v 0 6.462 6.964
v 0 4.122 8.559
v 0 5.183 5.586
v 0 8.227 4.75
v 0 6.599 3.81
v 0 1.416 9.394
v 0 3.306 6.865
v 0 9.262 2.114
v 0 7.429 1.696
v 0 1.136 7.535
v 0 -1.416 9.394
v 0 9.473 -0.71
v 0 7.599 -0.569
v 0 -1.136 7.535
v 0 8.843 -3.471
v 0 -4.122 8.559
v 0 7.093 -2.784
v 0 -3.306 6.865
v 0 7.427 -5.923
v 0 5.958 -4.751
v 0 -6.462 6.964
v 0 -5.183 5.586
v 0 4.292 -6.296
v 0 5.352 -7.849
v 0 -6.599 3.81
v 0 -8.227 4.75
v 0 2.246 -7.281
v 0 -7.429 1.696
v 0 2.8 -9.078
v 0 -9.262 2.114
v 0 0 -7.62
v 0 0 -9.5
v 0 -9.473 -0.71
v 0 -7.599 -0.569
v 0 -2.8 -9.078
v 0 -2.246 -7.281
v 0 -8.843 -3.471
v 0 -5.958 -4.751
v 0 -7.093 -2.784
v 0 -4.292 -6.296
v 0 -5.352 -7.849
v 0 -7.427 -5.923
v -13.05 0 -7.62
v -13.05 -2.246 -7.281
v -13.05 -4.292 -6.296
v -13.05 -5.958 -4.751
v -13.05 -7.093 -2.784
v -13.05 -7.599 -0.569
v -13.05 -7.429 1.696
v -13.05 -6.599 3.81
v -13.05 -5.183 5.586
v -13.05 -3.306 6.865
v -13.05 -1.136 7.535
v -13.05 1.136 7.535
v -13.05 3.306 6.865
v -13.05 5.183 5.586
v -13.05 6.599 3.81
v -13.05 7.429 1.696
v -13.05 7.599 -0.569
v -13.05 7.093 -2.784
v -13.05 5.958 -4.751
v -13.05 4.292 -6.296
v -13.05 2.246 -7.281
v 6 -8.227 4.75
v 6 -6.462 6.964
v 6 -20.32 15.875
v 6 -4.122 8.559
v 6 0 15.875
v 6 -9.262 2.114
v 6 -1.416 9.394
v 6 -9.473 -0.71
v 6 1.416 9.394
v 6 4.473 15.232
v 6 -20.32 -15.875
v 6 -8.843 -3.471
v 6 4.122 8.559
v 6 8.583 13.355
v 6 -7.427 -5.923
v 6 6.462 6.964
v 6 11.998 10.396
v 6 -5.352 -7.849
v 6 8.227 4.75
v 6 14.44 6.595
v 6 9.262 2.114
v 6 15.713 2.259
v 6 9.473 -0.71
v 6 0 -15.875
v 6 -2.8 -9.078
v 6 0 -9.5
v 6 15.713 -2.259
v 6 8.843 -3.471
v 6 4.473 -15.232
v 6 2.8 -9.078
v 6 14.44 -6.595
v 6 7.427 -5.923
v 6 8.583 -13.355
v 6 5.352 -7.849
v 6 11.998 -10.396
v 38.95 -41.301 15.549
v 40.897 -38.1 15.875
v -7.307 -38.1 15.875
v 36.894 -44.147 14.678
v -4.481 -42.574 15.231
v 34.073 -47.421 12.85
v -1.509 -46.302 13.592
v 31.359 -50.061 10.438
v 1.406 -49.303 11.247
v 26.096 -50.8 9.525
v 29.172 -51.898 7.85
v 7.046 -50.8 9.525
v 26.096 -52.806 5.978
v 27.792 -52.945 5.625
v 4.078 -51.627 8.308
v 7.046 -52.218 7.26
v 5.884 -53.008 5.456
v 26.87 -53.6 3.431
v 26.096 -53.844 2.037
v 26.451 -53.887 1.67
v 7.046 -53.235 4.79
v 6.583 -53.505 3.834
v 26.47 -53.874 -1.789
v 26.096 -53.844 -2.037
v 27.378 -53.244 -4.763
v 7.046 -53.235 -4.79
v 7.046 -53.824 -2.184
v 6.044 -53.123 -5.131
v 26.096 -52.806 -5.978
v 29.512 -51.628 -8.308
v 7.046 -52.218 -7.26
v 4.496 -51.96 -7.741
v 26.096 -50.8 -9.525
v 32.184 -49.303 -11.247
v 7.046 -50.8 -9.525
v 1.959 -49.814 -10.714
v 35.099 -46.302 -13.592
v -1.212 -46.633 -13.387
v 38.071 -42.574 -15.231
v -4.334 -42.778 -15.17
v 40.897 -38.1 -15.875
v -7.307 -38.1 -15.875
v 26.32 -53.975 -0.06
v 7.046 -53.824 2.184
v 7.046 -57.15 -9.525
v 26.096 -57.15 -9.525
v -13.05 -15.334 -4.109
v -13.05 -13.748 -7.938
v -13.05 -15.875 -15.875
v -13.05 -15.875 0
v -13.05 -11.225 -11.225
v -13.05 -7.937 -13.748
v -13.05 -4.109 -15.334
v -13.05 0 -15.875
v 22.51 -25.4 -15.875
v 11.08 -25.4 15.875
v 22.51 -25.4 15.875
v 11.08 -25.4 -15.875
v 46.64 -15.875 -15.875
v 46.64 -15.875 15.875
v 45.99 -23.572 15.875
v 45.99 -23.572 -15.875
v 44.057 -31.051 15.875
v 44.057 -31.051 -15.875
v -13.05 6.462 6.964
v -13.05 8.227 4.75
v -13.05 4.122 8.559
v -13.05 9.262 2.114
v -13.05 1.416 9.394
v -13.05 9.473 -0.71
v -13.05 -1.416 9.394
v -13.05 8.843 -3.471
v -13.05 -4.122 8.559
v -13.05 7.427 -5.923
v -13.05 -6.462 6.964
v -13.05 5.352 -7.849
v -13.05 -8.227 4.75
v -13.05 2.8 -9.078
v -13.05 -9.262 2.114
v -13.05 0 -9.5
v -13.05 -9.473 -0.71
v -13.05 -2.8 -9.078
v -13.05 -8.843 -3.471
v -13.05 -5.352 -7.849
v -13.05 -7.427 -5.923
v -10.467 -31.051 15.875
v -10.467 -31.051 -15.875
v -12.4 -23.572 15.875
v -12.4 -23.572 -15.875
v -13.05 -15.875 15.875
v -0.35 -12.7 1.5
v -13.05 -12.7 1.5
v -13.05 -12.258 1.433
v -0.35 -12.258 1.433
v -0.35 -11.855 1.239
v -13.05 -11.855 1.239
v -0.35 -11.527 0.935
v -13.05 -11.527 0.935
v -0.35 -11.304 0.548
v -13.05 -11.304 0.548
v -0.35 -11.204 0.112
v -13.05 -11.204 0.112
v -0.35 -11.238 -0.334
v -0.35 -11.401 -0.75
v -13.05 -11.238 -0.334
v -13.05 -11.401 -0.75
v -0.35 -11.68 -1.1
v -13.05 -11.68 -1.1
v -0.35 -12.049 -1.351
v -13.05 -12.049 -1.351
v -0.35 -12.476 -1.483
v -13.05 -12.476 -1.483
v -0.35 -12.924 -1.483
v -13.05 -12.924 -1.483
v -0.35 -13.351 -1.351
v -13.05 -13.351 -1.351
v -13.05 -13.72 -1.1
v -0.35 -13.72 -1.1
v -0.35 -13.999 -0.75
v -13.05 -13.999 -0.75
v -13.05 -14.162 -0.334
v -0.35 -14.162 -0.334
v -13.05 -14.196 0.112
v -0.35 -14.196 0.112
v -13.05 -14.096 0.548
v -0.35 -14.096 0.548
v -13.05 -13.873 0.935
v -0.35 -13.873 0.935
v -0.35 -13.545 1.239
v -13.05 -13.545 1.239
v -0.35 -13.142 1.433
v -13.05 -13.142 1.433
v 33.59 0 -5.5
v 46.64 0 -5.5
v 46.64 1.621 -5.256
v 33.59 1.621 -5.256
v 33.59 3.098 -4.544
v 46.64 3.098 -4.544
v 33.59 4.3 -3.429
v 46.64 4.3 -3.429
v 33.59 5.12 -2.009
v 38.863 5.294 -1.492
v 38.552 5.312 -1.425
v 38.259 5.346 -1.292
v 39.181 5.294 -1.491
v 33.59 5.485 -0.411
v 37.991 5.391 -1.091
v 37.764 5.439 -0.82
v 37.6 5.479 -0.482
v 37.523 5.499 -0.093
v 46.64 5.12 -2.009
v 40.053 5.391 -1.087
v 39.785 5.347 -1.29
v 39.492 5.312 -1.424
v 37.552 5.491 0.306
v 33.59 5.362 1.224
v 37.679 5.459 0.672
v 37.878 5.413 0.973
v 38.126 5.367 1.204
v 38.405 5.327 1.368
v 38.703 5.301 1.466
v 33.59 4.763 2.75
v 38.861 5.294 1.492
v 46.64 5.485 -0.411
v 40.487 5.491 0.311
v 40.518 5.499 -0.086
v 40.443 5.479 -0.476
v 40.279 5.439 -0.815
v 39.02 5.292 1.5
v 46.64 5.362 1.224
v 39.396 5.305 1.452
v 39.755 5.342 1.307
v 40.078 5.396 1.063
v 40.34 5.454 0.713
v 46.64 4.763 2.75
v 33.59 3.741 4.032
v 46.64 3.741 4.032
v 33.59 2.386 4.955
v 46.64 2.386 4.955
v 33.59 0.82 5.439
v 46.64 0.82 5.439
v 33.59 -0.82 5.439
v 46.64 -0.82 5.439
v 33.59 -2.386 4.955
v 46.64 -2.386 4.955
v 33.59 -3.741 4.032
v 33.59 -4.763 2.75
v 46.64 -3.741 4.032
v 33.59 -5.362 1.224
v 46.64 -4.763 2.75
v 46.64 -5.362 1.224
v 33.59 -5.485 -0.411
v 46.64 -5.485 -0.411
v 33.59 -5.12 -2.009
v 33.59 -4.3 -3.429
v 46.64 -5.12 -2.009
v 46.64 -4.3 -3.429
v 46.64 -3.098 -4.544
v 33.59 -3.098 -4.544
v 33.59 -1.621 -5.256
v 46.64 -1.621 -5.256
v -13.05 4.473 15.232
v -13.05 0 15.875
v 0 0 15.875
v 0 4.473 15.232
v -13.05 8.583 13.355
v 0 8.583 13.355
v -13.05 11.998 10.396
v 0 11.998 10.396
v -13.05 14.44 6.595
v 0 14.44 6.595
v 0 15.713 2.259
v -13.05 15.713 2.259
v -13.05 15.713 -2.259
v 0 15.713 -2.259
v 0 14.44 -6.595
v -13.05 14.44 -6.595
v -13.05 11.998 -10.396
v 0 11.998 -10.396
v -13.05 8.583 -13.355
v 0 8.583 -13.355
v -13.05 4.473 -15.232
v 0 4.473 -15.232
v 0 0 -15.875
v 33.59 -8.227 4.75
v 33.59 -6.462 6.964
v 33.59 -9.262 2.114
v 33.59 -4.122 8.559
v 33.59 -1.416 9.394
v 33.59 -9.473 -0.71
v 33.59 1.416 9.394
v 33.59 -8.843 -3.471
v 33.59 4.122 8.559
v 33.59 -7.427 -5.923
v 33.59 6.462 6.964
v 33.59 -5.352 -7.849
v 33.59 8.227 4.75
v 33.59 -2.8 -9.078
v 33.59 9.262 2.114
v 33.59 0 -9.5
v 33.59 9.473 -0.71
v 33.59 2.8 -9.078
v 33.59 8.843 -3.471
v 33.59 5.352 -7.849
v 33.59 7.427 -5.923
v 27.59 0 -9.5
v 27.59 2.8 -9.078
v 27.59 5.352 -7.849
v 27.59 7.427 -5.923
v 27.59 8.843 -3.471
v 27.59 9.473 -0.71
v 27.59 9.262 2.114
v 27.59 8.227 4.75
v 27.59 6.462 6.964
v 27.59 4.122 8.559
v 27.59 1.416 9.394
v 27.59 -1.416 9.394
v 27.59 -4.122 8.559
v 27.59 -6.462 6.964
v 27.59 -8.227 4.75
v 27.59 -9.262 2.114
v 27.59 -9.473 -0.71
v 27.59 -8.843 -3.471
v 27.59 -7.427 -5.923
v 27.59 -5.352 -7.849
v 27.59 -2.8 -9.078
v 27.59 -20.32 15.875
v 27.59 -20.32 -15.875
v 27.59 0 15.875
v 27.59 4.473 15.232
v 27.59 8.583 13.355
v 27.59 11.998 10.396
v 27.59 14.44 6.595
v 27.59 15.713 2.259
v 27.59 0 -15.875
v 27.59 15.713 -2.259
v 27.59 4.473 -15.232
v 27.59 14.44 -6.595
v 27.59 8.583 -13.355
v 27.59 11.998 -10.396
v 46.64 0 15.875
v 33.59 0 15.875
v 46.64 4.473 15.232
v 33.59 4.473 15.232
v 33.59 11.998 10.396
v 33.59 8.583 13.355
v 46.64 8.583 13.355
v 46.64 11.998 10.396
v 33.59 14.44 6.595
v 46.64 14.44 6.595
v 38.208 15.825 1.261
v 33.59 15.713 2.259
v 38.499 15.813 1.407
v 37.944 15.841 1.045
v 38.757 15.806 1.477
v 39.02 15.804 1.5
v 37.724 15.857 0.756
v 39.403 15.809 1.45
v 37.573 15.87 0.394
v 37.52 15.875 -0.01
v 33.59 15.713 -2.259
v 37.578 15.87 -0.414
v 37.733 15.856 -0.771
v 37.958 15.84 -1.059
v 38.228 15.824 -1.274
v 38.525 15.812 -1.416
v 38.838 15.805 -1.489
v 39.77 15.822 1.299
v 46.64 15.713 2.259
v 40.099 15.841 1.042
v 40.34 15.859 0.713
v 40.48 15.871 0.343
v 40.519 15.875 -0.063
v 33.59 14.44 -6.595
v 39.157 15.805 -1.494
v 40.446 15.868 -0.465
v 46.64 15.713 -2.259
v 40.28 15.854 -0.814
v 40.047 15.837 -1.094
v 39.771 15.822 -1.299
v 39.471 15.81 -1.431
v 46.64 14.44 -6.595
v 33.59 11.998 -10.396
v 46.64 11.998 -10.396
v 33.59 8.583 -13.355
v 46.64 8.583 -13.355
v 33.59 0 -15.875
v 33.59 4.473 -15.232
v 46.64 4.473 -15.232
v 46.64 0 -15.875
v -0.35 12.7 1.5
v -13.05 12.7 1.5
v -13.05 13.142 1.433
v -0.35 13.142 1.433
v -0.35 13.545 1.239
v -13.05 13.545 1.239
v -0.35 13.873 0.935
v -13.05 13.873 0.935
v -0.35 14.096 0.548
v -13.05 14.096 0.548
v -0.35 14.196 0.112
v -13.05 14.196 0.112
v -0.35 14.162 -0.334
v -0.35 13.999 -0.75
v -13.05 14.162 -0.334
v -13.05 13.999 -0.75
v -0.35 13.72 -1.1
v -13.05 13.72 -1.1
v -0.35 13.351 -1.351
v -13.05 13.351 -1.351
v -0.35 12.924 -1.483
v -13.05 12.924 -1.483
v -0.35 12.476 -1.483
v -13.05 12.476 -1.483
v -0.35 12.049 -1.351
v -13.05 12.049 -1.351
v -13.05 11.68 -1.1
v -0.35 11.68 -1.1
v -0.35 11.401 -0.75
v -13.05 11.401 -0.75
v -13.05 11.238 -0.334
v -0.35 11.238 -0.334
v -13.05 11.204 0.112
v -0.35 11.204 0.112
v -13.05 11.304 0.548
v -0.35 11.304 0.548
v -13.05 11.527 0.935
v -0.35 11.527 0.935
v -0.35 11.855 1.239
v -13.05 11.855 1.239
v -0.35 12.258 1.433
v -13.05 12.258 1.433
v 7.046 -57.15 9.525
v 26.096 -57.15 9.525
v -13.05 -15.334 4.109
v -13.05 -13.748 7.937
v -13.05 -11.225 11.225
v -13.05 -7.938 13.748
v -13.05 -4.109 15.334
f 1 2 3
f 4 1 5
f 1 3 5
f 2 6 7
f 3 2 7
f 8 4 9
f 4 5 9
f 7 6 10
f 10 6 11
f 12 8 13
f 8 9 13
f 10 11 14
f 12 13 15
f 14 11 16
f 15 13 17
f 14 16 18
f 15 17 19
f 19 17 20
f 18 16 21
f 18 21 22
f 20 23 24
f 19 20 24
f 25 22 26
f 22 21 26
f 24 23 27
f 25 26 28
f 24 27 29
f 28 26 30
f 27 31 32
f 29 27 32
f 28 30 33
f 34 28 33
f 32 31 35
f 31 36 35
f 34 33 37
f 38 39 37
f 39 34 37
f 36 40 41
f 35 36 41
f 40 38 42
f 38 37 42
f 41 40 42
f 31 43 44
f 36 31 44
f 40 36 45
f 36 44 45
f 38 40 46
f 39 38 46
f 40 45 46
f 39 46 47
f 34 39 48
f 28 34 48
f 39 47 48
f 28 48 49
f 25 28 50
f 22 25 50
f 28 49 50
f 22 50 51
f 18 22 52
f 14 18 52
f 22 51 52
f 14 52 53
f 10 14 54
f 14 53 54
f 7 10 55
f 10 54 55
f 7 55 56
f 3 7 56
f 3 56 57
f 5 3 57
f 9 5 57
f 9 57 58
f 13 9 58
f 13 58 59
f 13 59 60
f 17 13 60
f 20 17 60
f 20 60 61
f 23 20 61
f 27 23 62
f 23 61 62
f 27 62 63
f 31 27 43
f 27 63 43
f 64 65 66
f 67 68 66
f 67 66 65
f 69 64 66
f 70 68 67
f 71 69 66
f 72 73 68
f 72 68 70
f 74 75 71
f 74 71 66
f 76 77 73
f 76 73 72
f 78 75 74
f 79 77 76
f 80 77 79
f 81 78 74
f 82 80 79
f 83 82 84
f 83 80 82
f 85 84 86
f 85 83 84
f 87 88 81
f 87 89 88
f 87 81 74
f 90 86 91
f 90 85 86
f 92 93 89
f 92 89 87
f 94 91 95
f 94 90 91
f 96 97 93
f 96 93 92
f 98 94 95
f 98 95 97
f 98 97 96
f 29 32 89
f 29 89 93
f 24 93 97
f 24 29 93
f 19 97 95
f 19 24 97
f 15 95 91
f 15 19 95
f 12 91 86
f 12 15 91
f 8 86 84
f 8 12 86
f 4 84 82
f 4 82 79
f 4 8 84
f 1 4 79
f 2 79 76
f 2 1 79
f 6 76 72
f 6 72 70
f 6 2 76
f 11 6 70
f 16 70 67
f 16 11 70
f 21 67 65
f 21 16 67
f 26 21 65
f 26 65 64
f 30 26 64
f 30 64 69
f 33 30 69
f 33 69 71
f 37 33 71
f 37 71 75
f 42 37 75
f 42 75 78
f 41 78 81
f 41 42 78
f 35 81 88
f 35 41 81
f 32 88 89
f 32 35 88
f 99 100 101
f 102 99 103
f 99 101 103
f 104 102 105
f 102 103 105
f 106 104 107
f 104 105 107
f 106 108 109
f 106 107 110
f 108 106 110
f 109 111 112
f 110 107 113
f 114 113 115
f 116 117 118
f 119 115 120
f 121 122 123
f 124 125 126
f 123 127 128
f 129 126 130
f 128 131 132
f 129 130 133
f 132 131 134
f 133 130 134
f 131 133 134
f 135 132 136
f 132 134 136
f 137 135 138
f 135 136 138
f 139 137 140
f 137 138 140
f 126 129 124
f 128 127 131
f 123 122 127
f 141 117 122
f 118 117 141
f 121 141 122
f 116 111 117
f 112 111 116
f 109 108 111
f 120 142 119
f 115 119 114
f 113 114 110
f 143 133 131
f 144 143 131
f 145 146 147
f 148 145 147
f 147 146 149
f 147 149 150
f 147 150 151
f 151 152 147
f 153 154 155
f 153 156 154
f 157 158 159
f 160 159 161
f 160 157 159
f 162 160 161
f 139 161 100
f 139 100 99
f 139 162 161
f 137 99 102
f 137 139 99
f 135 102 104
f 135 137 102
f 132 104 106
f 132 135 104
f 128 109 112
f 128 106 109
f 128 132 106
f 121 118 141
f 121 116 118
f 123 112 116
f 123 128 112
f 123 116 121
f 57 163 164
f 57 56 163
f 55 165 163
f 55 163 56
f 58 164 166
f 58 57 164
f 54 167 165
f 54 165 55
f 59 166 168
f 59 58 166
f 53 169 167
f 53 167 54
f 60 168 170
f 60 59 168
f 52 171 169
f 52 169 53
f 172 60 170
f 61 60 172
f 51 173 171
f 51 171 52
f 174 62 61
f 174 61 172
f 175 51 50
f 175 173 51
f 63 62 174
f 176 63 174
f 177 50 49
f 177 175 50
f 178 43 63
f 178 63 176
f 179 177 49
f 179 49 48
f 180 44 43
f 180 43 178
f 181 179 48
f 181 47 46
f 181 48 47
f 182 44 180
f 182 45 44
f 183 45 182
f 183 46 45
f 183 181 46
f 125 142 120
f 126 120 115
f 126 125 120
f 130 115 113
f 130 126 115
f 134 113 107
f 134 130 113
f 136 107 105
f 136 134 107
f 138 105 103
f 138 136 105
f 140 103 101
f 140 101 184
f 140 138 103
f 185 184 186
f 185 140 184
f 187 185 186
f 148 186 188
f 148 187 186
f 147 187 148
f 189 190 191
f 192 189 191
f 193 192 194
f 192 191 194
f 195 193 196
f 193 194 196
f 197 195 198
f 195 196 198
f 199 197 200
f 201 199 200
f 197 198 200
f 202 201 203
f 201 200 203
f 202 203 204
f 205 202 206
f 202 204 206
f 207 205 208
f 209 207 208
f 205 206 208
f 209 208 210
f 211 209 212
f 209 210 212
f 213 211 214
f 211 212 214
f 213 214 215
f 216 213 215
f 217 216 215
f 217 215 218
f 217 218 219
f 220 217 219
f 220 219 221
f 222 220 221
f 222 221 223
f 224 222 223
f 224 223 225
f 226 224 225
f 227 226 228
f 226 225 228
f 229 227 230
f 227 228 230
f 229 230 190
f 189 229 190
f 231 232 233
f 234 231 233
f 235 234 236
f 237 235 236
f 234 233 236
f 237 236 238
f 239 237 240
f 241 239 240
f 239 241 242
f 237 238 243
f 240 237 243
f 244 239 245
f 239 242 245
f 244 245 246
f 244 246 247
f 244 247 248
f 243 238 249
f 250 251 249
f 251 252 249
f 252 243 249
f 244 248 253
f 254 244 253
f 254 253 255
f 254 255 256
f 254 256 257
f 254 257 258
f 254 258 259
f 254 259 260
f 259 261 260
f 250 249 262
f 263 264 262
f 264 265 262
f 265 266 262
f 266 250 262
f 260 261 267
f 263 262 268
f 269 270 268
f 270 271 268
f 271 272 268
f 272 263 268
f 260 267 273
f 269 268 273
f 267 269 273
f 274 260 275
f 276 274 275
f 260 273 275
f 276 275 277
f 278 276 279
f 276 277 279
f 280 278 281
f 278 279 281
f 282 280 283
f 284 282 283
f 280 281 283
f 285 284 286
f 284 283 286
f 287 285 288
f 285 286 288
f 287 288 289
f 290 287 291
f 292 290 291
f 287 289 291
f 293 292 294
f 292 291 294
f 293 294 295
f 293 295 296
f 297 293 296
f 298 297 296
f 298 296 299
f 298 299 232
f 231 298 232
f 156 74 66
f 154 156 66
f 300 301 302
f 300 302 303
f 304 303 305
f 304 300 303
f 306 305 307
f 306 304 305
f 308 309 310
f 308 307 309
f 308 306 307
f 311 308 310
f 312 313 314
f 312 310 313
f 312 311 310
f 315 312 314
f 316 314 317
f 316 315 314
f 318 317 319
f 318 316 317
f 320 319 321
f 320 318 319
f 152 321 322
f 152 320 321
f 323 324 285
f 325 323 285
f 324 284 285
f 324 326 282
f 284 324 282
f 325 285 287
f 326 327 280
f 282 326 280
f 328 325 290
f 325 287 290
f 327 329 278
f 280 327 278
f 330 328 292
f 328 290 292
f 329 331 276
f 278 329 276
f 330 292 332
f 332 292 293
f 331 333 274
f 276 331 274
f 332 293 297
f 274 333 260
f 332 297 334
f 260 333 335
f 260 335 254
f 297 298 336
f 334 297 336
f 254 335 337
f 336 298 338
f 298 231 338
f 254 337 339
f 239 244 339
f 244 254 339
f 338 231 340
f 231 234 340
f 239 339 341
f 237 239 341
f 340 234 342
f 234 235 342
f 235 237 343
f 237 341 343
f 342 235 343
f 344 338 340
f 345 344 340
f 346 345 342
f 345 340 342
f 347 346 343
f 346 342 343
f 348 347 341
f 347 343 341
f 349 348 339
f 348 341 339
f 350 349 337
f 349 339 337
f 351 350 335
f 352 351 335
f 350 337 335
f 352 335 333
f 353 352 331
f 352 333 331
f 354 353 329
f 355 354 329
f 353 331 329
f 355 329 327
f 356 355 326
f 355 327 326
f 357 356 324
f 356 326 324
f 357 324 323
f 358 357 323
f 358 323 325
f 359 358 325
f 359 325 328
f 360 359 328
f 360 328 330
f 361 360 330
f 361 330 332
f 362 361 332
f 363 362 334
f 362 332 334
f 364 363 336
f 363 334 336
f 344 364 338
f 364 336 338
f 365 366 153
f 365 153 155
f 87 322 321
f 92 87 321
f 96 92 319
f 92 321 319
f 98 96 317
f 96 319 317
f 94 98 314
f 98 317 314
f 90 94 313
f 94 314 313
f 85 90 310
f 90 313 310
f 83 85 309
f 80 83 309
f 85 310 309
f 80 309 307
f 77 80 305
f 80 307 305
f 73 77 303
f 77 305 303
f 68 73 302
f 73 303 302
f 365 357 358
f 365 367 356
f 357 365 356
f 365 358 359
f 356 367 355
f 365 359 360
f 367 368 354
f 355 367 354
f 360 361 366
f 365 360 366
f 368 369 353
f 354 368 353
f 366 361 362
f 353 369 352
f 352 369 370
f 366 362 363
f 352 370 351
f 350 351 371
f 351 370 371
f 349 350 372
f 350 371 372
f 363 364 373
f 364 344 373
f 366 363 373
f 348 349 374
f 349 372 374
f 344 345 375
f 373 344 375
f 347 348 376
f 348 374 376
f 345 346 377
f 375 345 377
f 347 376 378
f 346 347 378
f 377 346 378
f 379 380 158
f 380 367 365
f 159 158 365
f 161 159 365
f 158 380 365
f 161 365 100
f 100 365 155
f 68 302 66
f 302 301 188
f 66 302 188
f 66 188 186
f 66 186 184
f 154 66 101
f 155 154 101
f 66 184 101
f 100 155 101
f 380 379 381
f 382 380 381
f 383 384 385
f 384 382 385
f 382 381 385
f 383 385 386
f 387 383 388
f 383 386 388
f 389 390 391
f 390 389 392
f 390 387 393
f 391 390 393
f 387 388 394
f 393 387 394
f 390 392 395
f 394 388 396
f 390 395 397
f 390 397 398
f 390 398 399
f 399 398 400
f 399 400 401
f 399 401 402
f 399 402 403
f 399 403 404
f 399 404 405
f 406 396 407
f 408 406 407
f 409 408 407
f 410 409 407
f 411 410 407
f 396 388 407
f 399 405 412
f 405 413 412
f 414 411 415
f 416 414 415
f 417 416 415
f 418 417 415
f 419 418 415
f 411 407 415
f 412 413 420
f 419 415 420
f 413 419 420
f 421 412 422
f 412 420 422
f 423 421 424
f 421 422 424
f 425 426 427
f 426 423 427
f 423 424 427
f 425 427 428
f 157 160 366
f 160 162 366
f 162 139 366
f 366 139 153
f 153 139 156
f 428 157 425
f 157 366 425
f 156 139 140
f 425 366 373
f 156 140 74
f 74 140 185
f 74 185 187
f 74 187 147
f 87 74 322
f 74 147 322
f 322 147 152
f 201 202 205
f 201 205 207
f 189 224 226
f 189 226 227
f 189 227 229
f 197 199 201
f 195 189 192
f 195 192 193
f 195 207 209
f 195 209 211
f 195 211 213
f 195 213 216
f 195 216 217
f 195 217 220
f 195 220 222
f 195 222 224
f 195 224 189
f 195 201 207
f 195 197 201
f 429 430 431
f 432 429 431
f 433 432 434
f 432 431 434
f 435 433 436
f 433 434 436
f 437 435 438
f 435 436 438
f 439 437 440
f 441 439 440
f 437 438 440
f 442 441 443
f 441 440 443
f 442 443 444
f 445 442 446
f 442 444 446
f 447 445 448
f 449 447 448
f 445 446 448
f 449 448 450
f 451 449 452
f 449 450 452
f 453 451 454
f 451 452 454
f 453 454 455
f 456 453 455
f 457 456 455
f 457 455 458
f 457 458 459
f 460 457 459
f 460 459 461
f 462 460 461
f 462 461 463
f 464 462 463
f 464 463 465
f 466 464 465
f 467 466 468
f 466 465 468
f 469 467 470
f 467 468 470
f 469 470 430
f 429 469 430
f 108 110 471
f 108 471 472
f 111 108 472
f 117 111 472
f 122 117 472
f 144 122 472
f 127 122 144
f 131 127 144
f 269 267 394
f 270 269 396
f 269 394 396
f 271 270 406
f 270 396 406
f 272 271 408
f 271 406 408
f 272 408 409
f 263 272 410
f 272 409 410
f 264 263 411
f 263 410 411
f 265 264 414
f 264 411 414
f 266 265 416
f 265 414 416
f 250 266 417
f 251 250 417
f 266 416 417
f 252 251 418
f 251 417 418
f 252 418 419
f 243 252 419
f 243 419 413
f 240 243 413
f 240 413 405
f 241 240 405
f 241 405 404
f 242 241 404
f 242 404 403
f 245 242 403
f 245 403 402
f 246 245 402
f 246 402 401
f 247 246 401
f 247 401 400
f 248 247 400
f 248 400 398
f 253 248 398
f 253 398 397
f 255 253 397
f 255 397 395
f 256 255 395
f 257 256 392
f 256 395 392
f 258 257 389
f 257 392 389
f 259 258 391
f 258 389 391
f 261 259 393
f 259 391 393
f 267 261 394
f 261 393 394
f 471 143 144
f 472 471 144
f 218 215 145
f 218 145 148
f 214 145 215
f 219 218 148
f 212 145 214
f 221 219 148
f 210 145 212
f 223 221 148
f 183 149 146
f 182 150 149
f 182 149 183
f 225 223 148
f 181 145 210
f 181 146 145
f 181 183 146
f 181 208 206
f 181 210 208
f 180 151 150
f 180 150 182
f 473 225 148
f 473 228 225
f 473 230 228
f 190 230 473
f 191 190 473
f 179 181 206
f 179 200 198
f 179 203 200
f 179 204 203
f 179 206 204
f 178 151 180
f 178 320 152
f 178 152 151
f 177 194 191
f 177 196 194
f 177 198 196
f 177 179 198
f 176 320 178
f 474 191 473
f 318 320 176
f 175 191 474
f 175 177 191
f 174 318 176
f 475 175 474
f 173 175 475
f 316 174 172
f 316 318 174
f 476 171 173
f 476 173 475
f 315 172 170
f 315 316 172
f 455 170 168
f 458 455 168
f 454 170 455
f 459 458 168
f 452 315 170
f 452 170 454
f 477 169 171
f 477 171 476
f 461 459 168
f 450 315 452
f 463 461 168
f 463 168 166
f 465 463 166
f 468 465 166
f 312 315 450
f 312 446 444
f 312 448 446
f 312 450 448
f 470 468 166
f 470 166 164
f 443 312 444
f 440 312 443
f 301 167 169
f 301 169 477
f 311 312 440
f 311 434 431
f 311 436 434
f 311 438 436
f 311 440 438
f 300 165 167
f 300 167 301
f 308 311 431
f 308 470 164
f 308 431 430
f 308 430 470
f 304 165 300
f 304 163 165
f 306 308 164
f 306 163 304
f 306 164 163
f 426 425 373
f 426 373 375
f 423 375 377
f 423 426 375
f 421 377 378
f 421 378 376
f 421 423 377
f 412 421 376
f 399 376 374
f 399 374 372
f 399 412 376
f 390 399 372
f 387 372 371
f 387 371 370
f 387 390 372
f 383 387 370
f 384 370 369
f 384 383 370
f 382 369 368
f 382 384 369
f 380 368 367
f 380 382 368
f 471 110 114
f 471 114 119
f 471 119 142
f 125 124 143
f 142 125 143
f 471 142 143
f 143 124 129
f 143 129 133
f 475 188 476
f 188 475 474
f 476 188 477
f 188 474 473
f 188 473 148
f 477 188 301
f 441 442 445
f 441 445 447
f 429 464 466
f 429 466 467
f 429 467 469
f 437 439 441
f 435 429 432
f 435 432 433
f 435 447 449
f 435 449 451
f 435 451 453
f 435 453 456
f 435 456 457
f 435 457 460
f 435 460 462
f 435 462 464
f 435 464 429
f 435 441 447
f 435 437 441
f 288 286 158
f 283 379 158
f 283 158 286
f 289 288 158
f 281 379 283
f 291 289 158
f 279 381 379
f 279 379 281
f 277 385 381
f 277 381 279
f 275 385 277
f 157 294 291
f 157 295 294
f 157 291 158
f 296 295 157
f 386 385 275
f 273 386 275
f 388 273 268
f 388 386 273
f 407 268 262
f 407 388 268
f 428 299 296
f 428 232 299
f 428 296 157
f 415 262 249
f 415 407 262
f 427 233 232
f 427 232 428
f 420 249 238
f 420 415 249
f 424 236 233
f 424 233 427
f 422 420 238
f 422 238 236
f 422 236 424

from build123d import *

# Parameters (mm, degrees)
SKETCH1_R               = 15.875
SKETCH1_R_2             = 9.5
BOSS_EXTRUDE1_DEPTH     = 6
BOSS_EXTRUDE2_START     = 13.050000062
SKETCH2_R               = 15.875
SKETCH2_R_2             = 9.5
SKETCH2_R_3             = 7.62
BOSS_EXTRUDE2_DEPTH     = 13.050000062
BOSS_EXTRUDE3_START     = -19.050000062
BOSS_EXTRUDE3_DEPTH     = 19.050000062
BOSS_EXTRUDE4_START     = 21.59
BOSS_EXTRUDE4_DEPTH     = 19.050000062
BOSS_EXTRUDE5_REACH     = 71.404
CUT_EXTRUDE1_START      = -31.75
CUT_EXTRUDE1_DEPTH      = 31.75
SKETCH9_W               = 19.05
SKETCH9_H               = 19.05
BOSS_EXTRUDE8_DEPTH     = 31.75
CHAMFER1_SIZE           = 5.08
SKETCH6_R               = 7.62
SKETCH6_R_2             = 5.25
BOSS_EXTRUDE6_DEPTH     = 13.050000062
SKETCH7_R               = 1.5
CUT_EXTRUDE2_DEPTH      = 12.7
CUT_EXTRUDE3_REACH      = 90.091
CUT_EXTRUDE3_END_RADIUS = 5.25
SKETCH8_R               = 1.5
CUT_EXTRUDE4_REACH      = 86.149
SKETCH10_R              = 5.5
SKETCH10_R_2            = 5.25


# Read off the part's stored shape, not the designer's step: Cut-Extrude1
with BuildPart() as part:
    # Sketch1 → Boss-Extrude1 (new body)
    with BuildSketch(Plane(origin=(0, 0, 0), x_dir=(0, 0, -1), z_dir=(1, 0, 0))):
        Circle(SKETCH1_R)
        Circle(SKETCH1_R_2, mode=Mode.SUBTRACT)
    extrude(amount=BOSS_EXTRUDE1_DEPTH)

    # Sketch2 → Boss-Extrude2 (add)
    # profile 1 of 2: a face of its own
    with BuildSketch(Plane.ZY.offset(BOSS_EXTRUDE2_START)):
        Circle(SKETCH2_R)
        with Locations(Location((0, 0, 0), (0, 0, 180))):
            Circle(SKETCH2_R_2, mode=Mode.SUBTRACT)
    # profile 2 of 2: a face of its own
    with BuildSketch(Plane.ZY.offset(BOSS_EXTRUDE2_START)):
        with Locations(Location((0, 0, 0), (0, 0, 180))):
            Circle(SKETCH2_R_2)
        with Locations(Location((0, 0, 0), (0, 0, 180))):
            Circle(SKETCH2_R_3, mode=Mode.SUBTRACT)
    extrude(amount=-BOSS_EXTRUDE2_DEPTH)


with BuildPart() as body_2:
    # Mirror2: mirrored copy
    add(part.part.mirror(Plane(origin=(16.795, 0, 0), x_dir=(0, 0, 1), z_dir=(1, 0, 0))))

    # Sketch3<3> → Boss-Extrude4 (add)
    with BuildSketch(Plane(origin=(6, 0, 0), x_dir=(0, 0, -1), z_dir=(1, 0, 0)).offset(BOSS_EXTRUDE4_START)):
        with BuildLine():
            ThreePointArc((15.875, 0), (0, -15.875), (-15.875, 0))
            Line((-15.875, 0), (-15.875, -38.1))
            ThreePointArc((-15.875, -38.1), (0, -53.975), (15.875, -38.1))
            Line((15.875, -38.1), (15.875, 0))
        make_face()
    extrude(amount=BOSS_EXTRUDE4_DEPTH)

    # Sketch4 → Boss-Extrude5 (add, up to next)
    with BuildSketch(Plane(origin=(6, 0, 0), x_dir=(0, 0, -1), z_dir=(1, 0, 0)), mode=Mode.PRIVATE) as boss_extrude5_sk1:
        with BuildLine():
            Line((15.875, -25.4), (-15.875, -25.4))
            Line((-15.875, -25.4), (-15.875, -38.1))
            ThreePointArc((-15.875, -38.1), (0, -53.975), (15.875, -38.1))
            Line((15.875, -38.1), (15.875, -25.4))
        make_face()
    boss_extrude5_tool1 = extrude(boss_extrude5_sk1.sketch, amount=BOSS_EXTRUDE5_REACH, mode=Mode.PRIVATE) - body_2.part


with BuildPart() as part_1:
    add(part.part)

    # Sketch3 → Boss-Extrude3 (add)
    with BuildSketch(Plane(origin=(6, 0, 0), x_dir=(0, 0, -1), z_dir=(1, 0, 0)).offset(BOSS_EXTRUDE3_START)):
        with BuildLine():
            ThreePointArc((15.875, 0), (0, -15.875), (-15.875, 0))
            Line((-15.875, 0), (-15.875, -38.1))
            ThreePointArc((-15.875, -38.1), (0, -53.975), (15.875, -38.1))
            Line((15.875, -38.1), (15.875, 0))
        make_face()
    extrude(amount=BOSS_EXTRUDE3_DEPTH)


with BuildPart() as body_2_1:
    add(body_2.part)

    add(part_1.part)  # Boss-Extrude5 merges part
    add(boss_extrude5_tool1.solids().sort_by_distance((6, -38.23351, 0))[0])

    # Cut-Extrude1 outline → Cut-Extrude1 (cut)
    with BuildSketch(Plane.XY.offset(15.875).offset(CUT_EXTRUDE1_START)):
        with BuildLine():
            Line((-13.050000062, -15.875), (-13.050000062, -53.975))
            Line((-13.050000062, -53.975), (7.27, -53.975))
            ThreePointArc((7.27, -53.975), (-7.652500044, -37.465000015), (-13.050000062, -15.875))
        make_face()
        with BuildLine():
            ThreePointArc((46.640000062, -15.875), (41.242500044, -37.465000015), (26.32, -53.975))
            Line((26.32, -53.975), (46.640000062, -53.975))
            Line((46.640000062, -53.975), (46.640000062, -15.875))
        make_face()
    extrude(amount=CUT_EXTRUDE1_DEPTH, mode=Mode.SUBTRACT)

    # Sketch9 → Boss-Extrude8 (add)
    with BuildSketch(Plane(origin=(0, -25.4, 0), x_dir=(1, 0, 0), z_dir=(0, 1, 0))):
        with Locations((16.571454424, 0)):
            Rectangle(SKETCH9_W, SKETCH9_H)
    extrude(amount=-BOSS_EXTRUDE8_DEPTH)

    # Chamfer1
    chamfer1_edges = [body_2_1.edges().sort_by_distance(p)[0] for p in [
        (6, -25.4, 0),
        (27.59, -25.4, 0),
    ]]
    chamfer(chamfer1_edges, length=CHAMFER1_SIZE)

    # Sketch6 → Boss-Extrude6 (add)
    with BuildSketch(Plane(origin=(46.640000062, 0, 0), x_dir=(0, 0, -1), z_dir=(1, 0, 0))):
        Circle(SKETCH6_R)
        Circle(SKETCH6_R_2, mode=Mode.SUBTRACT)
    extrude(amount=-BOSS_EXTRUDE6_DEPTH)

    # Sketch7 → Cut-Extrude2 (cut)
    with BuildSketch(Plane.ZY.offset(13.050000062)):
        with Locations((0, 12.7)):
            Circle(SKETCH7_R)
        with Locations((0, -12.7)):
            Circle(SKETCH7_R)
    extrude(amount=-CUT_EXTRUDE2_DEPTH, mode=Mode.SUBTRACT)

    # Cut-Extrude3: up to this cylinder (the profile starts outside it)
    cut_extrude3_end = Plane(origin=(39.02, 0, 0), z_dir=(1, 0, 0)) * Cylinder(CUT_EXTRUDE3_END_RADIUS, 191.682, mode=Mode.PRIVATE)
    # Sketch8 → Cut-Extrude3 (cut, up to the surface)
    with BuildSketch(Plane(origin=(0, 15.875, 0), x_dir=(1, 0, 0), z_dir=(0, 1, 0)), mode=Mode.PRIVATE) as cut_extrude3_sk1:
        with Locations(Location((39.020000062, 0, 0), (0, 0, 270))):
            Circle(SKETCH8_R)
    cut_extrude3_tool1 = extrude(cut_extrude3_sk1.sketch, amount=-CUT_EXTRUDE3_REACH, mode=Mode.PRIVATE) - cut_extrude3_end
    add(cut_extrude3_tool1.solids().sort_by_distance((39.02, 15.875, 0))[0], mode=Mode.SUBTRACT)

    # Cut-Extrude4: up to this face of the body (flat: up to its plane)
    cut_extrude4_end = Plane(body_2_1.part.faces().sort_by_distance((33.59, 0, 9.231299423))[0])
    # Sketch10 → Cut-Extrude4 (cut, up to the picked face)
    with BuildSketch(Plane(origin=(46.640000062, 0, 0), x_dir=(0, 0, -1), z_dir=(1, 0, 0)), mode=Mode.PRIVATE) as cut_extrude4_sk1:
        Circle(SKETCH10_R)
        Circle(SKETCH10_R_2, mode=Mode.SUBTRACT)
    cut_extrude4_tool1 = split(extrude(cut_extrude4_sk1.sketch, amount=-CUT_EXTRUDE4_REACH, mode=Mode.PRIVATE), bisect_by=cut_extrude4_end, keep=Keep.BOTH, mode=Mode.PRIVATE)
    # Sketch10 → Cut-Extrude4 (cut, up to the picked face)
    with BuildSketch(Plane(origin=(46.640000062, 0, 0), x_dir=(0, 0, -1), z_dir=(1, 0, 0)), mode=Mode.PRIVATE) as cut_extrude4_sk2:
        Circle(SKETCH10_R_2)
    cut_extrude4_tool2 = split(extrude(cut_extrude4_sk2.sketch, amount=-CUT_EXTRUDE4_REACH, mode=Mode.PRIVATE), bisect_by=cut_extrude4_end, keep=Keep.BOTH, mode=Mode.PRIVATE)
    add(cut_extrude4_tool1.solids().sort_by(Axis((46.64, 0, 5.344437), (-1, 0, 0)))[0], mode=Mode.SUBTRACT)
    add(cut_extrude4_tool2.solids().sort_by(Axis((46.64, 0, 0), (-1, 0, 0)))[0], mode=Mode.SUBTRACT)


solid = body_2_1.part
